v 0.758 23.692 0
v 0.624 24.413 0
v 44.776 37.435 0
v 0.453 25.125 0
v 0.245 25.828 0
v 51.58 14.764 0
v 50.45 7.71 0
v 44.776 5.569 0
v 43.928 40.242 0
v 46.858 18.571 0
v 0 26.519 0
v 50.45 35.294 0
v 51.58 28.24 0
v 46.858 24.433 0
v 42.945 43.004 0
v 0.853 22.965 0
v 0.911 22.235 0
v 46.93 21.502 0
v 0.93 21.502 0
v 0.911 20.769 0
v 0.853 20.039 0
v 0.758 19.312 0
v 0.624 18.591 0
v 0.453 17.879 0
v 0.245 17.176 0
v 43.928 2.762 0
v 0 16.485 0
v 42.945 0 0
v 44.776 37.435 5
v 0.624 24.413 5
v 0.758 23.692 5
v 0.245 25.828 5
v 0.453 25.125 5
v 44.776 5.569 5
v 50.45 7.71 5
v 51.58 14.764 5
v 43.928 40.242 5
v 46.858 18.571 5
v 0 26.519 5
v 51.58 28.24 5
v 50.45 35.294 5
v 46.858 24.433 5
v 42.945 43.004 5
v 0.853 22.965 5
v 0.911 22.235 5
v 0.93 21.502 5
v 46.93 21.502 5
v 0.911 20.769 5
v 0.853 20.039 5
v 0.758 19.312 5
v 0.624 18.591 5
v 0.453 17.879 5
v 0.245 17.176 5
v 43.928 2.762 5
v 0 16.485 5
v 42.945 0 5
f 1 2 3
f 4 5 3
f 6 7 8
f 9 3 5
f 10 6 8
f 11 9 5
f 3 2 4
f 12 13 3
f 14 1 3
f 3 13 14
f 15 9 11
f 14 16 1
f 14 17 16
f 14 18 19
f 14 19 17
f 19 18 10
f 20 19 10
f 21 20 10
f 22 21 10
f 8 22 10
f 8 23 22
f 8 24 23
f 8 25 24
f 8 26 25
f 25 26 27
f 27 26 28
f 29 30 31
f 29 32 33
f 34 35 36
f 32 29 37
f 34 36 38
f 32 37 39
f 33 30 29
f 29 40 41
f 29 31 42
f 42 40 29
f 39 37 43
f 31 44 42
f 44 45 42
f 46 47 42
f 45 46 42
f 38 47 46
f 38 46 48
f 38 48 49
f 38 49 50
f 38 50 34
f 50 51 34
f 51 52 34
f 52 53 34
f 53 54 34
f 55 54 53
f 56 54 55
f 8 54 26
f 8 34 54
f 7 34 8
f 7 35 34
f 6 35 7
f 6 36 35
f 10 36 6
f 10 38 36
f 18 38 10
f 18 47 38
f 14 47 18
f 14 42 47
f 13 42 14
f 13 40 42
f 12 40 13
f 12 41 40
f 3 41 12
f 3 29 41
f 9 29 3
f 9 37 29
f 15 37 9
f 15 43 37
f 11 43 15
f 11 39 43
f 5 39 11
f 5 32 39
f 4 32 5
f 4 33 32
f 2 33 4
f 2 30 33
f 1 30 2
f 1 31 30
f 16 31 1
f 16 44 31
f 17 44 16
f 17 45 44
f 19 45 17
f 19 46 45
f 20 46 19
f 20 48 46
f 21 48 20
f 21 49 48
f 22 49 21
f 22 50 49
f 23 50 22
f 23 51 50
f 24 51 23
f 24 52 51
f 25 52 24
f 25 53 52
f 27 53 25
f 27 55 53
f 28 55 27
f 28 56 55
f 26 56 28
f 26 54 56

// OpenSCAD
$fn = 32;

// ----------------------------------------------------------------------
// Gear sector: 2 teeth on 42 degrees
// ----------------------------------------------------------------------

// --- parameters (mm) ---
sector_angle = 42;        // sector angle, degrees
root_r = 60;              // root circle radius
tooth_h = 5;              // tooth height over the root circle
teeth = 2;                // number of teeth on the sector
hub_r = 14;               // hub bore radius
plate_t = 5;              // sector thickness, Z
arc_step = 3;             // sampling step of the root/hub arcs, degrees

tip_r = root_r + tooth_h;  // tip circle radius

profile = [[42.945, 0], [43.928, 2.762], [44.776, 5.569], [50.45, 7.71], [51.58, 14.764], [46.858, 18.571], [46.93, 21.502], [46.858, 24.433], [51.58, 28.24], [50.45, 35.294], [44.776, 37.435], [43.928, 40.242], [42.945, 43.004], [0, 26.519], [0.245, 25.828], [0.453, 25.125], [0.624, 24.413], [0.758, 23.692], [0.853, 22.965], [0.911, 22.235], [0.93, 21.502], [0.911, 20.769], [0.853, 20.039], [0.758, 19.312], [0.624, 18.591], [0.453, 17.879], [0.245, 17.176], [0, 16.485]];  // primary outline, 28 points, counter clockwise

// --- the one profile operation ---
linear_extrude(height = plate_t) polygon(points = profile);
